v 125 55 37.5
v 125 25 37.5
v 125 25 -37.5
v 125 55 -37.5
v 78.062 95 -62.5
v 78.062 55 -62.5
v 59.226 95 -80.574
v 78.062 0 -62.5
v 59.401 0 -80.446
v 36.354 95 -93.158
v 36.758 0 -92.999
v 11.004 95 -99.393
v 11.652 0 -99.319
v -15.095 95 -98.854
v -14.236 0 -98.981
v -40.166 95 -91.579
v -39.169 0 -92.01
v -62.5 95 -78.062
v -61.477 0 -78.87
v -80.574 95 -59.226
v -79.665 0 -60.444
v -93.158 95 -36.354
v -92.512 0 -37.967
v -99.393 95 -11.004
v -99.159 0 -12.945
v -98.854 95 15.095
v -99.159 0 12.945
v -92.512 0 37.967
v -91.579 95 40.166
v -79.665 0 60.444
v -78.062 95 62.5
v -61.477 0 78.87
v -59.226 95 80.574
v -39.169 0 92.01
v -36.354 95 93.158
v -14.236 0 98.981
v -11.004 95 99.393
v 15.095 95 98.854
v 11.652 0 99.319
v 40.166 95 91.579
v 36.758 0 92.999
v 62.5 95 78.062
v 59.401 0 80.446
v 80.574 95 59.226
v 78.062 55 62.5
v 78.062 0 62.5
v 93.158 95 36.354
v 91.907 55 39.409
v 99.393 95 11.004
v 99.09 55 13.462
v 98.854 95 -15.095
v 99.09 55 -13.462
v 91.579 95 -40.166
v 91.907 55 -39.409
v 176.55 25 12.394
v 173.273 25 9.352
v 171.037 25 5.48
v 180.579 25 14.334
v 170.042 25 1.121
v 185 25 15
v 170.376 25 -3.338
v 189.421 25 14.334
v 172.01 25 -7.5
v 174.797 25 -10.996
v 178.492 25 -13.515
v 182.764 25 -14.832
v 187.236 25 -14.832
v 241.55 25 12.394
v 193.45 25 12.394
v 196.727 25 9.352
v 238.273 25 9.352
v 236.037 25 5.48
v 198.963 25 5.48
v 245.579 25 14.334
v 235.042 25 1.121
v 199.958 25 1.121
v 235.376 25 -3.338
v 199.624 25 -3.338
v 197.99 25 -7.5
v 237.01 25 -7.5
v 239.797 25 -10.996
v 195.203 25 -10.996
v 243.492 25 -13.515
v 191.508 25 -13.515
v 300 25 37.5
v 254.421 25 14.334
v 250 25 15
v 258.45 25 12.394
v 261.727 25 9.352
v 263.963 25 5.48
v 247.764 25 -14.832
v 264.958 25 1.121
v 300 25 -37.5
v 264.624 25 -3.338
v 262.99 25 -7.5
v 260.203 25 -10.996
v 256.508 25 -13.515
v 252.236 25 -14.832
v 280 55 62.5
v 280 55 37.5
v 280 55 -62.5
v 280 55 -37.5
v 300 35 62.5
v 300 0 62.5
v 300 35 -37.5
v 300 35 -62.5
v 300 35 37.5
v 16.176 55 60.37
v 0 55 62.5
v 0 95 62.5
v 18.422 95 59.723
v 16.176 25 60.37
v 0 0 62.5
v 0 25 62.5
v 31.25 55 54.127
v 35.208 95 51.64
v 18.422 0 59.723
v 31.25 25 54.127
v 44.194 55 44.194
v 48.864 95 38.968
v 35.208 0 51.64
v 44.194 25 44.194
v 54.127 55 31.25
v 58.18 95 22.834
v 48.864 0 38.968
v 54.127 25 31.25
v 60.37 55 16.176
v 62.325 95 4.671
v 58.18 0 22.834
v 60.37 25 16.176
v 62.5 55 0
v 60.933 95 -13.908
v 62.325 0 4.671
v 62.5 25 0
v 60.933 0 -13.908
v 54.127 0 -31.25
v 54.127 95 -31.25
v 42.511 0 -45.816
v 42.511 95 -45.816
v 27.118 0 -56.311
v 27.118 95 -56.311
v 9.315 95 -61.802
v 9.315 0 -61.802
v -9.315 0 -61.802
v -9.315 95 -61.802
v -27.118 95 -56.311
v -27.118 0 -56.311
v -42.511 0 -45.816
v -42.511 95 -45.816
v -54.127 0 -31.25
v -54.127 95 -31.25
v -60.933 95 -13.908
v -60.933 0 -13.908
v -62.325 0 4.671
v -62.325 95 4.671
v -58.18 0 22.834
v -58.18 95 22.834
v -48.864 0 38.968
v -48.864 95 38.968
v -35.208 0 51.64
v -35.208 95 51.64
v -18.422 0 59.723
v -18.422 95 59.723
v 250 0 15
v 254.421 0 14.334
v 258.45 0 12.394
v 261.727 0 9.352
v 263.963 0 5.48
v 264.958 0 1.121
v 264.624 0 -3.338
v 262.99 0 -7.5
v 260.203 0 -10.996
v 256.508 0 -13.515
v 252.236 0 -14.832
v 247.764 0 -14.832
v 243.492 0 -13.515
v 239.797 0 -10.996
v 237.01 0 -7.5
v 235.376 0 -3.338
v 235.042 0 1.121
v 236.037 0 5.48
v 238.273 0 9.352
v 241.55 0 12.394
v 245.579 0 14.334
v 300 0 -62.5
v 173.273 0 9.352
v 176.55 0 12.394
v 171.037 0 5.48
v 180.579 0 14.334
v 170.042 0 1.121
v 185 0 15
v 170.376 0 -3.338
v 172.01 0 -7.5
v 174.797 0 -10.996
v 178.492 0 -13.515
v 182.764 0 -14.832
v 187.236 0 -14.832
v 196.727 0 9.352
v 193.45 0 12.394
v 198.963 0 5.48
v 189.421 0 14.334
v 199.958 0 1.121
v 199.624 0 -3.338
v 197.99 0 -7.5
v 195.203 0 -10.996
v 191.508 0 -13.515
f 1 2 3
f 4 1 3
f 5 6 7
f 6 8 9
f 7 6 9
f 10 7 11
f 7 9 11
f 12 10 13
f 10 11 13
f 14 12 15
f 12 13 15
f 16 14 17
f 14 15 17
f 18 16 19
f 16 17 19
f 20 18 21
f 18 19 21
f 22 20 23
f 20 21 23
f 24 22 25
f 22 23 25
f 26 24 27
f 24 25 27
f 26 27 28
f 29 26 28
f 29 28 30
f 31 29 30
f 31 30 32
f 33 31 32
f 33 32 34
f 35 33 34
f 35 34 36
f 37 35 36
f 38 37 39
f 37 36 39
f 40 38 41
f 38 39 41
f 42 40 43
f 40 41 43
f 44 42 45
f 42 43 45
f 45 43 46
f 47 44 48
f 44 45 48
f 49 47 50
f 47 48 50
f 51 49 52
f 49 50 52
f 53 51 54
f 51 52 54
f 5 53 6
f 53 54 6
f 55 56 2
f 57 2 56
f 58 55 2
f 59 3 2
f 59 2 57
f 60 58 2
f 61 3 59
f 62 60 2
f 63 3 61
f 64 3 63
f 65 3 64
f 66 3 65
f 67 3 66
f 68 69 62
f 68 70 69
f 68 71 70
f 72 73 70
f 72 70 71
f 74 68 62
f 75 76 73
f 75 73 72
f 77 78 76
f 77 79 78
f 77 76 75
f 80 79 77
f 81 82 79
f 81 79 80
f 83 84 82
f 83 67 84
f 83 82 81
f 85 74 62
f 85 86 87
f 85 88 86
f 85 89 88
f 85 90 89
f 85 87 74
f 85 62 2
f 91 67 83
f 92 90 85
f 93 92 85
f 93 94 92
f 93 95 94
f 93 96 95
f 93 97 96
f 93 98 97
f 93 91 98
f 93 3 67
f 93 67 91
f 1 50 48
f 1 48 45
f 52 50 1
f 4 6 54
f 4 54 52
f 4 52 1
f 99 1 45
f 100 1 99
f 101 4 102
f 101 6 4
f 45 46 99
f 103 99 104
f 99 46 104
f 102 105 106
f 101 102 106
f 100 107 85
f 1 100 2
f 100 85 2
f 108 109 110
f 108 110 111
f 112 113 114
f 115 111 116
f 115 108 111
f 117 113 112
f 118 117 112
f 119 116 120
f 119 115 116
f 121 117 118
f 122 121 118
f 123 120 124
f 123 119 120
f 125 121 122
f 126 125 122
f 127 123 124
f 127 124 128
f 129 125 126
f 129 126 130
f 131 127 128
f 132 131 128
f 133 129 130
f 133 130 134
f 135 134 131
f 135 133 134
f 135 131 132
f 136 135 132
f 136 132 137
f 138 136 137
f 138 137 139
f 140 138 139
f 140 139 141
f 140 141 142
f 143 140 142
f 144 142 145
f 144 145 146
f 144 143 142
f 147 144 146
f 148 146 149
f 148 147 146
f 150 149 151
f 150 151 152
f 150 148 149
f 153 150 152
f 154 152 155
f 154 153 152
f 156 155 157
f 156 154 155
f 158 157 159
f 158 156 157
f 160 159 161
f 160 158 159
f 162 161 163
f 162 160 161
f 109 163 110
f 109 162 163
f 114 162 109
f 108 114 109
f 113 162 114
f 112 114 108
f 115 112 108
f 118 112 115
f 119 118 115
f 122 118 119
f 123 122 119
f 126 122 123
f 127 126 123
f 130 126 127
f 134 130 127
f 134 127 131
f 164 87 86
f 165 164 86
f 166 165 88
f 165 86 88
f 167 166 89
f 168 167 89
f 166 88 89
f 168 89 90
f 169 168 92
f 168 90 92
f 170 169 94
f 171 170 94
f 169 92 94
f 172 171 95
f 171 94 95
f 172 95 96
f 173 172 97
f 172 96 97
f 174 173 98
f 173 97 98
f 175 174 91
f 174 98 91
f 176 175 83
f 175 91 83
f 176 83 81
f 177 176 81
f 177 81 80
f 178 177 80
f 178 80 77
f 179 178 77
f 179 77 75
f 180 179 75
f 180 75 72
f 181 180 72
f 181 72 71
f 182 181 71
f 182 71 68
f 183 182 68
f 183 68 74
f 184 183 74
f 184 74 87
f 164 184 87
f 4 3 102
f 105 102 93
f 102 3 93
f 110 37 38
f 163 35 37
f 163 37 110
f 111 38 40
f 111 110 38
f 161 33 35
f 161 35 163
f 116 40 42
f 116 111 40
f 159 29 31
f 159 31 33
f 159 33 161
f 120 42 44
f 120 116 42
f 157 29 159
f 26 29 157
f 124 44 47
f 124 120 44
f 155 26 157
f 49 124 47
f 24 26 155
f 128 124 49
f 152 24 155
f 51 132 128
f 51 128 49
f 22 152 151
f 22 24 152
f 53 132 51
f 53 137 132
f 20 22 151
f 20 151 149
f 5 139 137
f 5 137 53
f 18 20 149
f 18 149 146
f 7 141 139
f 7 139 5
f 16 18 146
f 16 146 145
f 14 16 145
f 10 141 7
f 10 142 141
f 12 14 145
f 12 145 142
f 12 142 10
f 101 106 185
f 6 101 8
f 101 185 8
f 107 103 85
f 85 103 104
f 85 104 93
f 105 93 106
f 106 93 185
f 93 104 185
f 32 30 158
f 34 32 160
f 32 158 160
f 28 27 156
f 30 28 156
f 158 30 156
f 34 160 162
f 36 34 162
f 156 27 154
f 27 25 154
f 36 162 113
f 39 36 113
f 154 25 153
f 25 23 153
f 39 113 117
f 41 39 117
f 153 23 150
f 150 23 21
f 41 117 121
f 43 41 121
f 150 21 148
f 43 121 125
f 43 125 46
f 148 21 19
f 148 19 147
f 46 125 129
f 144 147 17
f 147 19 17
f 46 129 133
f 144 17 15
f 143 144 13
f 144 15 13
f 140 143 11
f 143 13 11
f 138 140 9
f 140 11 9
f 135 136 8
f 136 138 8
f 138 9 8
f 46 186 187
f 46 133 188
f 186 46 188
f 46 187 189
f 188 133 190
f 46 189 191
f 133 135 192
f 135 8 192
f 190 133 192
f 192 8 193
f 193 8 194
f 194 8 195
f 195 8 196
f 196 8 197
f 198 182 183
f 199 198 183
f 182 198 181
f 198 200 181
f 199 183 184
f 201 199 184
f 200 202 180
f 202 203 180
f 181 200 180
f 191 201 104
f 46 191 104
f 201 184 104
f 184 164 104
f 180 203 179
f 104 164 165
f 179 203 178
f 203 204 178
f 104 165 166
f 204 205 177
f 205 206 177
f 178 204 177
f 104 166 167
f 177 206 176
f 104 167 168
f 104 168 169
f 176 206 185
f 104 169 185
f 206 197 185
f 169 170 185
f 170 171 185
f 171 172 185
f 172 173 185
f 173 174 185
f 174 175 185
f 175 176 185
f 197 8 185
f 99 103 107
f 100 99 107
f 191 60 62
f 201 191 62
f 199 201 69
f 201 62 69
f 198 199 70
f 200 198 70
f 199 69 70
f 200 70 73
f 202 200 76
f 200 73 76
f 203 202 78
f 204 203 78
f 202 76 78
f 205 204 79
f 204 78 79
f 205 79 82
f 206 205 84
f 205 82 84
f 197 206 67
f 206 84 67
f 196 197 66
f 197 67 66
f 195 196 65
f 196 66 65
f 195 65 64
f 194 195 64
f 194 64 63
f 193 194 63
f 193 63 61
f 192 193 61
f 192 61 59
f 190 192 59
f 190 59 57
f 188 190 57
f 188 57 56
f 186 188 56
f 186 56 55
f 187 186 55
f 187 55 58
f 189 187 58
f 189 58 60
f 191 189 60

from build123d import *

# Parameters (mm, degrees)
SKETCH1_R           = 62.5
BOSS_EXTRUDE1_DEPTH = 25
SKETCH1_3_R         = 62.5
BOSS_EXTRUDE2_DEPTH = 55
SKETCH1_4_R         = 62.5
BOSS_EXTRUDE3_DEPTH = 95
SKETCH3_R           = 15
CUT_EXTRUDE1_DEPTH  = 324.882694814
CHAMFER1_SIZE       = 20


with BuildPart() as part:
    # Sketch1 → Boss-Extrude1 (new body)
    with BuildSketch(Plane(origin=(0, 0, 0), x_dir=(1, 0, 0), z_dir=(0, 1, 0))):
        with BuildLine():
            Line((300, 62.5), (78.06247498, 62.5))
            ThreePointArc((78.06247498, 62.5), (-100, 0), (78.06247498, -62.5))
            Line((78.06247498, -62.5), (300, -62.5))
            Line((300, -62.5), (300, 62.5))
        make_face()
        Circle(SKETCH1_R, mode=Mode.SUBTRACT)
    extrude(amount=BOSS_EXTRUDE1_DEPTH)

    # Sketch1<3> → Boss-Extrude2 (add)
    with BuildSketch(Plane(origin=(0, 0, 0), x_dir=(1, 0, 0), z_dir=(0, 1, 0))):
        with BuildLine():
            Line((300, 62.5), (78.06247498, 62.5))
            ThreePointArc((78.06247498, 62.5), (-100, 0), (78.06247498, -62.5))
            Line((78.06247498, -62.5), (300, -62.5))
            Line((300, -62.5), (300, -37.5))
            Line((300, -37.5), (125, -37.5))
            Line((125, -37.5), (125, 37.5))
            Line((125, 37.5), (300, 37.5))
            Line((300, 37.5), (300, 62.5))
        make_face()
        Circle(SKETCH1_3_R, mode=Mode.SUBTRACT)
    extrude(amount=BOSS_EXTRUDE2_DEPTH)

    # Sketch1<4> → Boss-Extrude3 (add)
    with BuildSketch(Plane(origin=(0, 0, 0), x_dir=(1, 0, 0), z_dir=(0, 1, 0))):
        with BuildLine():
            ThreePointArc((100, 0), (94.356365705, 33.119122135), (78.06247498, 62.5))
            ThreePointArc((78.06247498, 62.5), (-100, 0), (78.06247498, -62.5))
            ThreePointArc((78.06247498, -62.5), (94.356365705, -33.119122135), (100, 0))
        make_face()
        Circle(SKETCH1_4_R, mode=Mode.SUBTRACT)
    extrude(amount=BOSS_EXTRUDE3_DEPTH)

    # Sketch3 → Cut-Extrude1 (cut, through all)
    with BuildSketch(Plane(origin=(0, 25, 0), x_dir=(1, 0, 0), z_dir=(0, 1, 0))):
        with Locations((250, 0)):
            Circle(SKETCH3_R)
        with Locations((185, 0)):
            Circle(SKETCH3_R)
    extrude(amount=-CUT_EXTRUDE1_DEPTH, mode=Mode.SUBTRACT)

    # Chamfer1
    chamfer1_edges = [part.edges().sort_by_distance(p)[0] for p in [
        (300, 55, 50),
        (300, 55, -50),
    ]]
    chamfer(chamfer1_edges, length=CHAMFER1_SIZE)


solid = part.part
